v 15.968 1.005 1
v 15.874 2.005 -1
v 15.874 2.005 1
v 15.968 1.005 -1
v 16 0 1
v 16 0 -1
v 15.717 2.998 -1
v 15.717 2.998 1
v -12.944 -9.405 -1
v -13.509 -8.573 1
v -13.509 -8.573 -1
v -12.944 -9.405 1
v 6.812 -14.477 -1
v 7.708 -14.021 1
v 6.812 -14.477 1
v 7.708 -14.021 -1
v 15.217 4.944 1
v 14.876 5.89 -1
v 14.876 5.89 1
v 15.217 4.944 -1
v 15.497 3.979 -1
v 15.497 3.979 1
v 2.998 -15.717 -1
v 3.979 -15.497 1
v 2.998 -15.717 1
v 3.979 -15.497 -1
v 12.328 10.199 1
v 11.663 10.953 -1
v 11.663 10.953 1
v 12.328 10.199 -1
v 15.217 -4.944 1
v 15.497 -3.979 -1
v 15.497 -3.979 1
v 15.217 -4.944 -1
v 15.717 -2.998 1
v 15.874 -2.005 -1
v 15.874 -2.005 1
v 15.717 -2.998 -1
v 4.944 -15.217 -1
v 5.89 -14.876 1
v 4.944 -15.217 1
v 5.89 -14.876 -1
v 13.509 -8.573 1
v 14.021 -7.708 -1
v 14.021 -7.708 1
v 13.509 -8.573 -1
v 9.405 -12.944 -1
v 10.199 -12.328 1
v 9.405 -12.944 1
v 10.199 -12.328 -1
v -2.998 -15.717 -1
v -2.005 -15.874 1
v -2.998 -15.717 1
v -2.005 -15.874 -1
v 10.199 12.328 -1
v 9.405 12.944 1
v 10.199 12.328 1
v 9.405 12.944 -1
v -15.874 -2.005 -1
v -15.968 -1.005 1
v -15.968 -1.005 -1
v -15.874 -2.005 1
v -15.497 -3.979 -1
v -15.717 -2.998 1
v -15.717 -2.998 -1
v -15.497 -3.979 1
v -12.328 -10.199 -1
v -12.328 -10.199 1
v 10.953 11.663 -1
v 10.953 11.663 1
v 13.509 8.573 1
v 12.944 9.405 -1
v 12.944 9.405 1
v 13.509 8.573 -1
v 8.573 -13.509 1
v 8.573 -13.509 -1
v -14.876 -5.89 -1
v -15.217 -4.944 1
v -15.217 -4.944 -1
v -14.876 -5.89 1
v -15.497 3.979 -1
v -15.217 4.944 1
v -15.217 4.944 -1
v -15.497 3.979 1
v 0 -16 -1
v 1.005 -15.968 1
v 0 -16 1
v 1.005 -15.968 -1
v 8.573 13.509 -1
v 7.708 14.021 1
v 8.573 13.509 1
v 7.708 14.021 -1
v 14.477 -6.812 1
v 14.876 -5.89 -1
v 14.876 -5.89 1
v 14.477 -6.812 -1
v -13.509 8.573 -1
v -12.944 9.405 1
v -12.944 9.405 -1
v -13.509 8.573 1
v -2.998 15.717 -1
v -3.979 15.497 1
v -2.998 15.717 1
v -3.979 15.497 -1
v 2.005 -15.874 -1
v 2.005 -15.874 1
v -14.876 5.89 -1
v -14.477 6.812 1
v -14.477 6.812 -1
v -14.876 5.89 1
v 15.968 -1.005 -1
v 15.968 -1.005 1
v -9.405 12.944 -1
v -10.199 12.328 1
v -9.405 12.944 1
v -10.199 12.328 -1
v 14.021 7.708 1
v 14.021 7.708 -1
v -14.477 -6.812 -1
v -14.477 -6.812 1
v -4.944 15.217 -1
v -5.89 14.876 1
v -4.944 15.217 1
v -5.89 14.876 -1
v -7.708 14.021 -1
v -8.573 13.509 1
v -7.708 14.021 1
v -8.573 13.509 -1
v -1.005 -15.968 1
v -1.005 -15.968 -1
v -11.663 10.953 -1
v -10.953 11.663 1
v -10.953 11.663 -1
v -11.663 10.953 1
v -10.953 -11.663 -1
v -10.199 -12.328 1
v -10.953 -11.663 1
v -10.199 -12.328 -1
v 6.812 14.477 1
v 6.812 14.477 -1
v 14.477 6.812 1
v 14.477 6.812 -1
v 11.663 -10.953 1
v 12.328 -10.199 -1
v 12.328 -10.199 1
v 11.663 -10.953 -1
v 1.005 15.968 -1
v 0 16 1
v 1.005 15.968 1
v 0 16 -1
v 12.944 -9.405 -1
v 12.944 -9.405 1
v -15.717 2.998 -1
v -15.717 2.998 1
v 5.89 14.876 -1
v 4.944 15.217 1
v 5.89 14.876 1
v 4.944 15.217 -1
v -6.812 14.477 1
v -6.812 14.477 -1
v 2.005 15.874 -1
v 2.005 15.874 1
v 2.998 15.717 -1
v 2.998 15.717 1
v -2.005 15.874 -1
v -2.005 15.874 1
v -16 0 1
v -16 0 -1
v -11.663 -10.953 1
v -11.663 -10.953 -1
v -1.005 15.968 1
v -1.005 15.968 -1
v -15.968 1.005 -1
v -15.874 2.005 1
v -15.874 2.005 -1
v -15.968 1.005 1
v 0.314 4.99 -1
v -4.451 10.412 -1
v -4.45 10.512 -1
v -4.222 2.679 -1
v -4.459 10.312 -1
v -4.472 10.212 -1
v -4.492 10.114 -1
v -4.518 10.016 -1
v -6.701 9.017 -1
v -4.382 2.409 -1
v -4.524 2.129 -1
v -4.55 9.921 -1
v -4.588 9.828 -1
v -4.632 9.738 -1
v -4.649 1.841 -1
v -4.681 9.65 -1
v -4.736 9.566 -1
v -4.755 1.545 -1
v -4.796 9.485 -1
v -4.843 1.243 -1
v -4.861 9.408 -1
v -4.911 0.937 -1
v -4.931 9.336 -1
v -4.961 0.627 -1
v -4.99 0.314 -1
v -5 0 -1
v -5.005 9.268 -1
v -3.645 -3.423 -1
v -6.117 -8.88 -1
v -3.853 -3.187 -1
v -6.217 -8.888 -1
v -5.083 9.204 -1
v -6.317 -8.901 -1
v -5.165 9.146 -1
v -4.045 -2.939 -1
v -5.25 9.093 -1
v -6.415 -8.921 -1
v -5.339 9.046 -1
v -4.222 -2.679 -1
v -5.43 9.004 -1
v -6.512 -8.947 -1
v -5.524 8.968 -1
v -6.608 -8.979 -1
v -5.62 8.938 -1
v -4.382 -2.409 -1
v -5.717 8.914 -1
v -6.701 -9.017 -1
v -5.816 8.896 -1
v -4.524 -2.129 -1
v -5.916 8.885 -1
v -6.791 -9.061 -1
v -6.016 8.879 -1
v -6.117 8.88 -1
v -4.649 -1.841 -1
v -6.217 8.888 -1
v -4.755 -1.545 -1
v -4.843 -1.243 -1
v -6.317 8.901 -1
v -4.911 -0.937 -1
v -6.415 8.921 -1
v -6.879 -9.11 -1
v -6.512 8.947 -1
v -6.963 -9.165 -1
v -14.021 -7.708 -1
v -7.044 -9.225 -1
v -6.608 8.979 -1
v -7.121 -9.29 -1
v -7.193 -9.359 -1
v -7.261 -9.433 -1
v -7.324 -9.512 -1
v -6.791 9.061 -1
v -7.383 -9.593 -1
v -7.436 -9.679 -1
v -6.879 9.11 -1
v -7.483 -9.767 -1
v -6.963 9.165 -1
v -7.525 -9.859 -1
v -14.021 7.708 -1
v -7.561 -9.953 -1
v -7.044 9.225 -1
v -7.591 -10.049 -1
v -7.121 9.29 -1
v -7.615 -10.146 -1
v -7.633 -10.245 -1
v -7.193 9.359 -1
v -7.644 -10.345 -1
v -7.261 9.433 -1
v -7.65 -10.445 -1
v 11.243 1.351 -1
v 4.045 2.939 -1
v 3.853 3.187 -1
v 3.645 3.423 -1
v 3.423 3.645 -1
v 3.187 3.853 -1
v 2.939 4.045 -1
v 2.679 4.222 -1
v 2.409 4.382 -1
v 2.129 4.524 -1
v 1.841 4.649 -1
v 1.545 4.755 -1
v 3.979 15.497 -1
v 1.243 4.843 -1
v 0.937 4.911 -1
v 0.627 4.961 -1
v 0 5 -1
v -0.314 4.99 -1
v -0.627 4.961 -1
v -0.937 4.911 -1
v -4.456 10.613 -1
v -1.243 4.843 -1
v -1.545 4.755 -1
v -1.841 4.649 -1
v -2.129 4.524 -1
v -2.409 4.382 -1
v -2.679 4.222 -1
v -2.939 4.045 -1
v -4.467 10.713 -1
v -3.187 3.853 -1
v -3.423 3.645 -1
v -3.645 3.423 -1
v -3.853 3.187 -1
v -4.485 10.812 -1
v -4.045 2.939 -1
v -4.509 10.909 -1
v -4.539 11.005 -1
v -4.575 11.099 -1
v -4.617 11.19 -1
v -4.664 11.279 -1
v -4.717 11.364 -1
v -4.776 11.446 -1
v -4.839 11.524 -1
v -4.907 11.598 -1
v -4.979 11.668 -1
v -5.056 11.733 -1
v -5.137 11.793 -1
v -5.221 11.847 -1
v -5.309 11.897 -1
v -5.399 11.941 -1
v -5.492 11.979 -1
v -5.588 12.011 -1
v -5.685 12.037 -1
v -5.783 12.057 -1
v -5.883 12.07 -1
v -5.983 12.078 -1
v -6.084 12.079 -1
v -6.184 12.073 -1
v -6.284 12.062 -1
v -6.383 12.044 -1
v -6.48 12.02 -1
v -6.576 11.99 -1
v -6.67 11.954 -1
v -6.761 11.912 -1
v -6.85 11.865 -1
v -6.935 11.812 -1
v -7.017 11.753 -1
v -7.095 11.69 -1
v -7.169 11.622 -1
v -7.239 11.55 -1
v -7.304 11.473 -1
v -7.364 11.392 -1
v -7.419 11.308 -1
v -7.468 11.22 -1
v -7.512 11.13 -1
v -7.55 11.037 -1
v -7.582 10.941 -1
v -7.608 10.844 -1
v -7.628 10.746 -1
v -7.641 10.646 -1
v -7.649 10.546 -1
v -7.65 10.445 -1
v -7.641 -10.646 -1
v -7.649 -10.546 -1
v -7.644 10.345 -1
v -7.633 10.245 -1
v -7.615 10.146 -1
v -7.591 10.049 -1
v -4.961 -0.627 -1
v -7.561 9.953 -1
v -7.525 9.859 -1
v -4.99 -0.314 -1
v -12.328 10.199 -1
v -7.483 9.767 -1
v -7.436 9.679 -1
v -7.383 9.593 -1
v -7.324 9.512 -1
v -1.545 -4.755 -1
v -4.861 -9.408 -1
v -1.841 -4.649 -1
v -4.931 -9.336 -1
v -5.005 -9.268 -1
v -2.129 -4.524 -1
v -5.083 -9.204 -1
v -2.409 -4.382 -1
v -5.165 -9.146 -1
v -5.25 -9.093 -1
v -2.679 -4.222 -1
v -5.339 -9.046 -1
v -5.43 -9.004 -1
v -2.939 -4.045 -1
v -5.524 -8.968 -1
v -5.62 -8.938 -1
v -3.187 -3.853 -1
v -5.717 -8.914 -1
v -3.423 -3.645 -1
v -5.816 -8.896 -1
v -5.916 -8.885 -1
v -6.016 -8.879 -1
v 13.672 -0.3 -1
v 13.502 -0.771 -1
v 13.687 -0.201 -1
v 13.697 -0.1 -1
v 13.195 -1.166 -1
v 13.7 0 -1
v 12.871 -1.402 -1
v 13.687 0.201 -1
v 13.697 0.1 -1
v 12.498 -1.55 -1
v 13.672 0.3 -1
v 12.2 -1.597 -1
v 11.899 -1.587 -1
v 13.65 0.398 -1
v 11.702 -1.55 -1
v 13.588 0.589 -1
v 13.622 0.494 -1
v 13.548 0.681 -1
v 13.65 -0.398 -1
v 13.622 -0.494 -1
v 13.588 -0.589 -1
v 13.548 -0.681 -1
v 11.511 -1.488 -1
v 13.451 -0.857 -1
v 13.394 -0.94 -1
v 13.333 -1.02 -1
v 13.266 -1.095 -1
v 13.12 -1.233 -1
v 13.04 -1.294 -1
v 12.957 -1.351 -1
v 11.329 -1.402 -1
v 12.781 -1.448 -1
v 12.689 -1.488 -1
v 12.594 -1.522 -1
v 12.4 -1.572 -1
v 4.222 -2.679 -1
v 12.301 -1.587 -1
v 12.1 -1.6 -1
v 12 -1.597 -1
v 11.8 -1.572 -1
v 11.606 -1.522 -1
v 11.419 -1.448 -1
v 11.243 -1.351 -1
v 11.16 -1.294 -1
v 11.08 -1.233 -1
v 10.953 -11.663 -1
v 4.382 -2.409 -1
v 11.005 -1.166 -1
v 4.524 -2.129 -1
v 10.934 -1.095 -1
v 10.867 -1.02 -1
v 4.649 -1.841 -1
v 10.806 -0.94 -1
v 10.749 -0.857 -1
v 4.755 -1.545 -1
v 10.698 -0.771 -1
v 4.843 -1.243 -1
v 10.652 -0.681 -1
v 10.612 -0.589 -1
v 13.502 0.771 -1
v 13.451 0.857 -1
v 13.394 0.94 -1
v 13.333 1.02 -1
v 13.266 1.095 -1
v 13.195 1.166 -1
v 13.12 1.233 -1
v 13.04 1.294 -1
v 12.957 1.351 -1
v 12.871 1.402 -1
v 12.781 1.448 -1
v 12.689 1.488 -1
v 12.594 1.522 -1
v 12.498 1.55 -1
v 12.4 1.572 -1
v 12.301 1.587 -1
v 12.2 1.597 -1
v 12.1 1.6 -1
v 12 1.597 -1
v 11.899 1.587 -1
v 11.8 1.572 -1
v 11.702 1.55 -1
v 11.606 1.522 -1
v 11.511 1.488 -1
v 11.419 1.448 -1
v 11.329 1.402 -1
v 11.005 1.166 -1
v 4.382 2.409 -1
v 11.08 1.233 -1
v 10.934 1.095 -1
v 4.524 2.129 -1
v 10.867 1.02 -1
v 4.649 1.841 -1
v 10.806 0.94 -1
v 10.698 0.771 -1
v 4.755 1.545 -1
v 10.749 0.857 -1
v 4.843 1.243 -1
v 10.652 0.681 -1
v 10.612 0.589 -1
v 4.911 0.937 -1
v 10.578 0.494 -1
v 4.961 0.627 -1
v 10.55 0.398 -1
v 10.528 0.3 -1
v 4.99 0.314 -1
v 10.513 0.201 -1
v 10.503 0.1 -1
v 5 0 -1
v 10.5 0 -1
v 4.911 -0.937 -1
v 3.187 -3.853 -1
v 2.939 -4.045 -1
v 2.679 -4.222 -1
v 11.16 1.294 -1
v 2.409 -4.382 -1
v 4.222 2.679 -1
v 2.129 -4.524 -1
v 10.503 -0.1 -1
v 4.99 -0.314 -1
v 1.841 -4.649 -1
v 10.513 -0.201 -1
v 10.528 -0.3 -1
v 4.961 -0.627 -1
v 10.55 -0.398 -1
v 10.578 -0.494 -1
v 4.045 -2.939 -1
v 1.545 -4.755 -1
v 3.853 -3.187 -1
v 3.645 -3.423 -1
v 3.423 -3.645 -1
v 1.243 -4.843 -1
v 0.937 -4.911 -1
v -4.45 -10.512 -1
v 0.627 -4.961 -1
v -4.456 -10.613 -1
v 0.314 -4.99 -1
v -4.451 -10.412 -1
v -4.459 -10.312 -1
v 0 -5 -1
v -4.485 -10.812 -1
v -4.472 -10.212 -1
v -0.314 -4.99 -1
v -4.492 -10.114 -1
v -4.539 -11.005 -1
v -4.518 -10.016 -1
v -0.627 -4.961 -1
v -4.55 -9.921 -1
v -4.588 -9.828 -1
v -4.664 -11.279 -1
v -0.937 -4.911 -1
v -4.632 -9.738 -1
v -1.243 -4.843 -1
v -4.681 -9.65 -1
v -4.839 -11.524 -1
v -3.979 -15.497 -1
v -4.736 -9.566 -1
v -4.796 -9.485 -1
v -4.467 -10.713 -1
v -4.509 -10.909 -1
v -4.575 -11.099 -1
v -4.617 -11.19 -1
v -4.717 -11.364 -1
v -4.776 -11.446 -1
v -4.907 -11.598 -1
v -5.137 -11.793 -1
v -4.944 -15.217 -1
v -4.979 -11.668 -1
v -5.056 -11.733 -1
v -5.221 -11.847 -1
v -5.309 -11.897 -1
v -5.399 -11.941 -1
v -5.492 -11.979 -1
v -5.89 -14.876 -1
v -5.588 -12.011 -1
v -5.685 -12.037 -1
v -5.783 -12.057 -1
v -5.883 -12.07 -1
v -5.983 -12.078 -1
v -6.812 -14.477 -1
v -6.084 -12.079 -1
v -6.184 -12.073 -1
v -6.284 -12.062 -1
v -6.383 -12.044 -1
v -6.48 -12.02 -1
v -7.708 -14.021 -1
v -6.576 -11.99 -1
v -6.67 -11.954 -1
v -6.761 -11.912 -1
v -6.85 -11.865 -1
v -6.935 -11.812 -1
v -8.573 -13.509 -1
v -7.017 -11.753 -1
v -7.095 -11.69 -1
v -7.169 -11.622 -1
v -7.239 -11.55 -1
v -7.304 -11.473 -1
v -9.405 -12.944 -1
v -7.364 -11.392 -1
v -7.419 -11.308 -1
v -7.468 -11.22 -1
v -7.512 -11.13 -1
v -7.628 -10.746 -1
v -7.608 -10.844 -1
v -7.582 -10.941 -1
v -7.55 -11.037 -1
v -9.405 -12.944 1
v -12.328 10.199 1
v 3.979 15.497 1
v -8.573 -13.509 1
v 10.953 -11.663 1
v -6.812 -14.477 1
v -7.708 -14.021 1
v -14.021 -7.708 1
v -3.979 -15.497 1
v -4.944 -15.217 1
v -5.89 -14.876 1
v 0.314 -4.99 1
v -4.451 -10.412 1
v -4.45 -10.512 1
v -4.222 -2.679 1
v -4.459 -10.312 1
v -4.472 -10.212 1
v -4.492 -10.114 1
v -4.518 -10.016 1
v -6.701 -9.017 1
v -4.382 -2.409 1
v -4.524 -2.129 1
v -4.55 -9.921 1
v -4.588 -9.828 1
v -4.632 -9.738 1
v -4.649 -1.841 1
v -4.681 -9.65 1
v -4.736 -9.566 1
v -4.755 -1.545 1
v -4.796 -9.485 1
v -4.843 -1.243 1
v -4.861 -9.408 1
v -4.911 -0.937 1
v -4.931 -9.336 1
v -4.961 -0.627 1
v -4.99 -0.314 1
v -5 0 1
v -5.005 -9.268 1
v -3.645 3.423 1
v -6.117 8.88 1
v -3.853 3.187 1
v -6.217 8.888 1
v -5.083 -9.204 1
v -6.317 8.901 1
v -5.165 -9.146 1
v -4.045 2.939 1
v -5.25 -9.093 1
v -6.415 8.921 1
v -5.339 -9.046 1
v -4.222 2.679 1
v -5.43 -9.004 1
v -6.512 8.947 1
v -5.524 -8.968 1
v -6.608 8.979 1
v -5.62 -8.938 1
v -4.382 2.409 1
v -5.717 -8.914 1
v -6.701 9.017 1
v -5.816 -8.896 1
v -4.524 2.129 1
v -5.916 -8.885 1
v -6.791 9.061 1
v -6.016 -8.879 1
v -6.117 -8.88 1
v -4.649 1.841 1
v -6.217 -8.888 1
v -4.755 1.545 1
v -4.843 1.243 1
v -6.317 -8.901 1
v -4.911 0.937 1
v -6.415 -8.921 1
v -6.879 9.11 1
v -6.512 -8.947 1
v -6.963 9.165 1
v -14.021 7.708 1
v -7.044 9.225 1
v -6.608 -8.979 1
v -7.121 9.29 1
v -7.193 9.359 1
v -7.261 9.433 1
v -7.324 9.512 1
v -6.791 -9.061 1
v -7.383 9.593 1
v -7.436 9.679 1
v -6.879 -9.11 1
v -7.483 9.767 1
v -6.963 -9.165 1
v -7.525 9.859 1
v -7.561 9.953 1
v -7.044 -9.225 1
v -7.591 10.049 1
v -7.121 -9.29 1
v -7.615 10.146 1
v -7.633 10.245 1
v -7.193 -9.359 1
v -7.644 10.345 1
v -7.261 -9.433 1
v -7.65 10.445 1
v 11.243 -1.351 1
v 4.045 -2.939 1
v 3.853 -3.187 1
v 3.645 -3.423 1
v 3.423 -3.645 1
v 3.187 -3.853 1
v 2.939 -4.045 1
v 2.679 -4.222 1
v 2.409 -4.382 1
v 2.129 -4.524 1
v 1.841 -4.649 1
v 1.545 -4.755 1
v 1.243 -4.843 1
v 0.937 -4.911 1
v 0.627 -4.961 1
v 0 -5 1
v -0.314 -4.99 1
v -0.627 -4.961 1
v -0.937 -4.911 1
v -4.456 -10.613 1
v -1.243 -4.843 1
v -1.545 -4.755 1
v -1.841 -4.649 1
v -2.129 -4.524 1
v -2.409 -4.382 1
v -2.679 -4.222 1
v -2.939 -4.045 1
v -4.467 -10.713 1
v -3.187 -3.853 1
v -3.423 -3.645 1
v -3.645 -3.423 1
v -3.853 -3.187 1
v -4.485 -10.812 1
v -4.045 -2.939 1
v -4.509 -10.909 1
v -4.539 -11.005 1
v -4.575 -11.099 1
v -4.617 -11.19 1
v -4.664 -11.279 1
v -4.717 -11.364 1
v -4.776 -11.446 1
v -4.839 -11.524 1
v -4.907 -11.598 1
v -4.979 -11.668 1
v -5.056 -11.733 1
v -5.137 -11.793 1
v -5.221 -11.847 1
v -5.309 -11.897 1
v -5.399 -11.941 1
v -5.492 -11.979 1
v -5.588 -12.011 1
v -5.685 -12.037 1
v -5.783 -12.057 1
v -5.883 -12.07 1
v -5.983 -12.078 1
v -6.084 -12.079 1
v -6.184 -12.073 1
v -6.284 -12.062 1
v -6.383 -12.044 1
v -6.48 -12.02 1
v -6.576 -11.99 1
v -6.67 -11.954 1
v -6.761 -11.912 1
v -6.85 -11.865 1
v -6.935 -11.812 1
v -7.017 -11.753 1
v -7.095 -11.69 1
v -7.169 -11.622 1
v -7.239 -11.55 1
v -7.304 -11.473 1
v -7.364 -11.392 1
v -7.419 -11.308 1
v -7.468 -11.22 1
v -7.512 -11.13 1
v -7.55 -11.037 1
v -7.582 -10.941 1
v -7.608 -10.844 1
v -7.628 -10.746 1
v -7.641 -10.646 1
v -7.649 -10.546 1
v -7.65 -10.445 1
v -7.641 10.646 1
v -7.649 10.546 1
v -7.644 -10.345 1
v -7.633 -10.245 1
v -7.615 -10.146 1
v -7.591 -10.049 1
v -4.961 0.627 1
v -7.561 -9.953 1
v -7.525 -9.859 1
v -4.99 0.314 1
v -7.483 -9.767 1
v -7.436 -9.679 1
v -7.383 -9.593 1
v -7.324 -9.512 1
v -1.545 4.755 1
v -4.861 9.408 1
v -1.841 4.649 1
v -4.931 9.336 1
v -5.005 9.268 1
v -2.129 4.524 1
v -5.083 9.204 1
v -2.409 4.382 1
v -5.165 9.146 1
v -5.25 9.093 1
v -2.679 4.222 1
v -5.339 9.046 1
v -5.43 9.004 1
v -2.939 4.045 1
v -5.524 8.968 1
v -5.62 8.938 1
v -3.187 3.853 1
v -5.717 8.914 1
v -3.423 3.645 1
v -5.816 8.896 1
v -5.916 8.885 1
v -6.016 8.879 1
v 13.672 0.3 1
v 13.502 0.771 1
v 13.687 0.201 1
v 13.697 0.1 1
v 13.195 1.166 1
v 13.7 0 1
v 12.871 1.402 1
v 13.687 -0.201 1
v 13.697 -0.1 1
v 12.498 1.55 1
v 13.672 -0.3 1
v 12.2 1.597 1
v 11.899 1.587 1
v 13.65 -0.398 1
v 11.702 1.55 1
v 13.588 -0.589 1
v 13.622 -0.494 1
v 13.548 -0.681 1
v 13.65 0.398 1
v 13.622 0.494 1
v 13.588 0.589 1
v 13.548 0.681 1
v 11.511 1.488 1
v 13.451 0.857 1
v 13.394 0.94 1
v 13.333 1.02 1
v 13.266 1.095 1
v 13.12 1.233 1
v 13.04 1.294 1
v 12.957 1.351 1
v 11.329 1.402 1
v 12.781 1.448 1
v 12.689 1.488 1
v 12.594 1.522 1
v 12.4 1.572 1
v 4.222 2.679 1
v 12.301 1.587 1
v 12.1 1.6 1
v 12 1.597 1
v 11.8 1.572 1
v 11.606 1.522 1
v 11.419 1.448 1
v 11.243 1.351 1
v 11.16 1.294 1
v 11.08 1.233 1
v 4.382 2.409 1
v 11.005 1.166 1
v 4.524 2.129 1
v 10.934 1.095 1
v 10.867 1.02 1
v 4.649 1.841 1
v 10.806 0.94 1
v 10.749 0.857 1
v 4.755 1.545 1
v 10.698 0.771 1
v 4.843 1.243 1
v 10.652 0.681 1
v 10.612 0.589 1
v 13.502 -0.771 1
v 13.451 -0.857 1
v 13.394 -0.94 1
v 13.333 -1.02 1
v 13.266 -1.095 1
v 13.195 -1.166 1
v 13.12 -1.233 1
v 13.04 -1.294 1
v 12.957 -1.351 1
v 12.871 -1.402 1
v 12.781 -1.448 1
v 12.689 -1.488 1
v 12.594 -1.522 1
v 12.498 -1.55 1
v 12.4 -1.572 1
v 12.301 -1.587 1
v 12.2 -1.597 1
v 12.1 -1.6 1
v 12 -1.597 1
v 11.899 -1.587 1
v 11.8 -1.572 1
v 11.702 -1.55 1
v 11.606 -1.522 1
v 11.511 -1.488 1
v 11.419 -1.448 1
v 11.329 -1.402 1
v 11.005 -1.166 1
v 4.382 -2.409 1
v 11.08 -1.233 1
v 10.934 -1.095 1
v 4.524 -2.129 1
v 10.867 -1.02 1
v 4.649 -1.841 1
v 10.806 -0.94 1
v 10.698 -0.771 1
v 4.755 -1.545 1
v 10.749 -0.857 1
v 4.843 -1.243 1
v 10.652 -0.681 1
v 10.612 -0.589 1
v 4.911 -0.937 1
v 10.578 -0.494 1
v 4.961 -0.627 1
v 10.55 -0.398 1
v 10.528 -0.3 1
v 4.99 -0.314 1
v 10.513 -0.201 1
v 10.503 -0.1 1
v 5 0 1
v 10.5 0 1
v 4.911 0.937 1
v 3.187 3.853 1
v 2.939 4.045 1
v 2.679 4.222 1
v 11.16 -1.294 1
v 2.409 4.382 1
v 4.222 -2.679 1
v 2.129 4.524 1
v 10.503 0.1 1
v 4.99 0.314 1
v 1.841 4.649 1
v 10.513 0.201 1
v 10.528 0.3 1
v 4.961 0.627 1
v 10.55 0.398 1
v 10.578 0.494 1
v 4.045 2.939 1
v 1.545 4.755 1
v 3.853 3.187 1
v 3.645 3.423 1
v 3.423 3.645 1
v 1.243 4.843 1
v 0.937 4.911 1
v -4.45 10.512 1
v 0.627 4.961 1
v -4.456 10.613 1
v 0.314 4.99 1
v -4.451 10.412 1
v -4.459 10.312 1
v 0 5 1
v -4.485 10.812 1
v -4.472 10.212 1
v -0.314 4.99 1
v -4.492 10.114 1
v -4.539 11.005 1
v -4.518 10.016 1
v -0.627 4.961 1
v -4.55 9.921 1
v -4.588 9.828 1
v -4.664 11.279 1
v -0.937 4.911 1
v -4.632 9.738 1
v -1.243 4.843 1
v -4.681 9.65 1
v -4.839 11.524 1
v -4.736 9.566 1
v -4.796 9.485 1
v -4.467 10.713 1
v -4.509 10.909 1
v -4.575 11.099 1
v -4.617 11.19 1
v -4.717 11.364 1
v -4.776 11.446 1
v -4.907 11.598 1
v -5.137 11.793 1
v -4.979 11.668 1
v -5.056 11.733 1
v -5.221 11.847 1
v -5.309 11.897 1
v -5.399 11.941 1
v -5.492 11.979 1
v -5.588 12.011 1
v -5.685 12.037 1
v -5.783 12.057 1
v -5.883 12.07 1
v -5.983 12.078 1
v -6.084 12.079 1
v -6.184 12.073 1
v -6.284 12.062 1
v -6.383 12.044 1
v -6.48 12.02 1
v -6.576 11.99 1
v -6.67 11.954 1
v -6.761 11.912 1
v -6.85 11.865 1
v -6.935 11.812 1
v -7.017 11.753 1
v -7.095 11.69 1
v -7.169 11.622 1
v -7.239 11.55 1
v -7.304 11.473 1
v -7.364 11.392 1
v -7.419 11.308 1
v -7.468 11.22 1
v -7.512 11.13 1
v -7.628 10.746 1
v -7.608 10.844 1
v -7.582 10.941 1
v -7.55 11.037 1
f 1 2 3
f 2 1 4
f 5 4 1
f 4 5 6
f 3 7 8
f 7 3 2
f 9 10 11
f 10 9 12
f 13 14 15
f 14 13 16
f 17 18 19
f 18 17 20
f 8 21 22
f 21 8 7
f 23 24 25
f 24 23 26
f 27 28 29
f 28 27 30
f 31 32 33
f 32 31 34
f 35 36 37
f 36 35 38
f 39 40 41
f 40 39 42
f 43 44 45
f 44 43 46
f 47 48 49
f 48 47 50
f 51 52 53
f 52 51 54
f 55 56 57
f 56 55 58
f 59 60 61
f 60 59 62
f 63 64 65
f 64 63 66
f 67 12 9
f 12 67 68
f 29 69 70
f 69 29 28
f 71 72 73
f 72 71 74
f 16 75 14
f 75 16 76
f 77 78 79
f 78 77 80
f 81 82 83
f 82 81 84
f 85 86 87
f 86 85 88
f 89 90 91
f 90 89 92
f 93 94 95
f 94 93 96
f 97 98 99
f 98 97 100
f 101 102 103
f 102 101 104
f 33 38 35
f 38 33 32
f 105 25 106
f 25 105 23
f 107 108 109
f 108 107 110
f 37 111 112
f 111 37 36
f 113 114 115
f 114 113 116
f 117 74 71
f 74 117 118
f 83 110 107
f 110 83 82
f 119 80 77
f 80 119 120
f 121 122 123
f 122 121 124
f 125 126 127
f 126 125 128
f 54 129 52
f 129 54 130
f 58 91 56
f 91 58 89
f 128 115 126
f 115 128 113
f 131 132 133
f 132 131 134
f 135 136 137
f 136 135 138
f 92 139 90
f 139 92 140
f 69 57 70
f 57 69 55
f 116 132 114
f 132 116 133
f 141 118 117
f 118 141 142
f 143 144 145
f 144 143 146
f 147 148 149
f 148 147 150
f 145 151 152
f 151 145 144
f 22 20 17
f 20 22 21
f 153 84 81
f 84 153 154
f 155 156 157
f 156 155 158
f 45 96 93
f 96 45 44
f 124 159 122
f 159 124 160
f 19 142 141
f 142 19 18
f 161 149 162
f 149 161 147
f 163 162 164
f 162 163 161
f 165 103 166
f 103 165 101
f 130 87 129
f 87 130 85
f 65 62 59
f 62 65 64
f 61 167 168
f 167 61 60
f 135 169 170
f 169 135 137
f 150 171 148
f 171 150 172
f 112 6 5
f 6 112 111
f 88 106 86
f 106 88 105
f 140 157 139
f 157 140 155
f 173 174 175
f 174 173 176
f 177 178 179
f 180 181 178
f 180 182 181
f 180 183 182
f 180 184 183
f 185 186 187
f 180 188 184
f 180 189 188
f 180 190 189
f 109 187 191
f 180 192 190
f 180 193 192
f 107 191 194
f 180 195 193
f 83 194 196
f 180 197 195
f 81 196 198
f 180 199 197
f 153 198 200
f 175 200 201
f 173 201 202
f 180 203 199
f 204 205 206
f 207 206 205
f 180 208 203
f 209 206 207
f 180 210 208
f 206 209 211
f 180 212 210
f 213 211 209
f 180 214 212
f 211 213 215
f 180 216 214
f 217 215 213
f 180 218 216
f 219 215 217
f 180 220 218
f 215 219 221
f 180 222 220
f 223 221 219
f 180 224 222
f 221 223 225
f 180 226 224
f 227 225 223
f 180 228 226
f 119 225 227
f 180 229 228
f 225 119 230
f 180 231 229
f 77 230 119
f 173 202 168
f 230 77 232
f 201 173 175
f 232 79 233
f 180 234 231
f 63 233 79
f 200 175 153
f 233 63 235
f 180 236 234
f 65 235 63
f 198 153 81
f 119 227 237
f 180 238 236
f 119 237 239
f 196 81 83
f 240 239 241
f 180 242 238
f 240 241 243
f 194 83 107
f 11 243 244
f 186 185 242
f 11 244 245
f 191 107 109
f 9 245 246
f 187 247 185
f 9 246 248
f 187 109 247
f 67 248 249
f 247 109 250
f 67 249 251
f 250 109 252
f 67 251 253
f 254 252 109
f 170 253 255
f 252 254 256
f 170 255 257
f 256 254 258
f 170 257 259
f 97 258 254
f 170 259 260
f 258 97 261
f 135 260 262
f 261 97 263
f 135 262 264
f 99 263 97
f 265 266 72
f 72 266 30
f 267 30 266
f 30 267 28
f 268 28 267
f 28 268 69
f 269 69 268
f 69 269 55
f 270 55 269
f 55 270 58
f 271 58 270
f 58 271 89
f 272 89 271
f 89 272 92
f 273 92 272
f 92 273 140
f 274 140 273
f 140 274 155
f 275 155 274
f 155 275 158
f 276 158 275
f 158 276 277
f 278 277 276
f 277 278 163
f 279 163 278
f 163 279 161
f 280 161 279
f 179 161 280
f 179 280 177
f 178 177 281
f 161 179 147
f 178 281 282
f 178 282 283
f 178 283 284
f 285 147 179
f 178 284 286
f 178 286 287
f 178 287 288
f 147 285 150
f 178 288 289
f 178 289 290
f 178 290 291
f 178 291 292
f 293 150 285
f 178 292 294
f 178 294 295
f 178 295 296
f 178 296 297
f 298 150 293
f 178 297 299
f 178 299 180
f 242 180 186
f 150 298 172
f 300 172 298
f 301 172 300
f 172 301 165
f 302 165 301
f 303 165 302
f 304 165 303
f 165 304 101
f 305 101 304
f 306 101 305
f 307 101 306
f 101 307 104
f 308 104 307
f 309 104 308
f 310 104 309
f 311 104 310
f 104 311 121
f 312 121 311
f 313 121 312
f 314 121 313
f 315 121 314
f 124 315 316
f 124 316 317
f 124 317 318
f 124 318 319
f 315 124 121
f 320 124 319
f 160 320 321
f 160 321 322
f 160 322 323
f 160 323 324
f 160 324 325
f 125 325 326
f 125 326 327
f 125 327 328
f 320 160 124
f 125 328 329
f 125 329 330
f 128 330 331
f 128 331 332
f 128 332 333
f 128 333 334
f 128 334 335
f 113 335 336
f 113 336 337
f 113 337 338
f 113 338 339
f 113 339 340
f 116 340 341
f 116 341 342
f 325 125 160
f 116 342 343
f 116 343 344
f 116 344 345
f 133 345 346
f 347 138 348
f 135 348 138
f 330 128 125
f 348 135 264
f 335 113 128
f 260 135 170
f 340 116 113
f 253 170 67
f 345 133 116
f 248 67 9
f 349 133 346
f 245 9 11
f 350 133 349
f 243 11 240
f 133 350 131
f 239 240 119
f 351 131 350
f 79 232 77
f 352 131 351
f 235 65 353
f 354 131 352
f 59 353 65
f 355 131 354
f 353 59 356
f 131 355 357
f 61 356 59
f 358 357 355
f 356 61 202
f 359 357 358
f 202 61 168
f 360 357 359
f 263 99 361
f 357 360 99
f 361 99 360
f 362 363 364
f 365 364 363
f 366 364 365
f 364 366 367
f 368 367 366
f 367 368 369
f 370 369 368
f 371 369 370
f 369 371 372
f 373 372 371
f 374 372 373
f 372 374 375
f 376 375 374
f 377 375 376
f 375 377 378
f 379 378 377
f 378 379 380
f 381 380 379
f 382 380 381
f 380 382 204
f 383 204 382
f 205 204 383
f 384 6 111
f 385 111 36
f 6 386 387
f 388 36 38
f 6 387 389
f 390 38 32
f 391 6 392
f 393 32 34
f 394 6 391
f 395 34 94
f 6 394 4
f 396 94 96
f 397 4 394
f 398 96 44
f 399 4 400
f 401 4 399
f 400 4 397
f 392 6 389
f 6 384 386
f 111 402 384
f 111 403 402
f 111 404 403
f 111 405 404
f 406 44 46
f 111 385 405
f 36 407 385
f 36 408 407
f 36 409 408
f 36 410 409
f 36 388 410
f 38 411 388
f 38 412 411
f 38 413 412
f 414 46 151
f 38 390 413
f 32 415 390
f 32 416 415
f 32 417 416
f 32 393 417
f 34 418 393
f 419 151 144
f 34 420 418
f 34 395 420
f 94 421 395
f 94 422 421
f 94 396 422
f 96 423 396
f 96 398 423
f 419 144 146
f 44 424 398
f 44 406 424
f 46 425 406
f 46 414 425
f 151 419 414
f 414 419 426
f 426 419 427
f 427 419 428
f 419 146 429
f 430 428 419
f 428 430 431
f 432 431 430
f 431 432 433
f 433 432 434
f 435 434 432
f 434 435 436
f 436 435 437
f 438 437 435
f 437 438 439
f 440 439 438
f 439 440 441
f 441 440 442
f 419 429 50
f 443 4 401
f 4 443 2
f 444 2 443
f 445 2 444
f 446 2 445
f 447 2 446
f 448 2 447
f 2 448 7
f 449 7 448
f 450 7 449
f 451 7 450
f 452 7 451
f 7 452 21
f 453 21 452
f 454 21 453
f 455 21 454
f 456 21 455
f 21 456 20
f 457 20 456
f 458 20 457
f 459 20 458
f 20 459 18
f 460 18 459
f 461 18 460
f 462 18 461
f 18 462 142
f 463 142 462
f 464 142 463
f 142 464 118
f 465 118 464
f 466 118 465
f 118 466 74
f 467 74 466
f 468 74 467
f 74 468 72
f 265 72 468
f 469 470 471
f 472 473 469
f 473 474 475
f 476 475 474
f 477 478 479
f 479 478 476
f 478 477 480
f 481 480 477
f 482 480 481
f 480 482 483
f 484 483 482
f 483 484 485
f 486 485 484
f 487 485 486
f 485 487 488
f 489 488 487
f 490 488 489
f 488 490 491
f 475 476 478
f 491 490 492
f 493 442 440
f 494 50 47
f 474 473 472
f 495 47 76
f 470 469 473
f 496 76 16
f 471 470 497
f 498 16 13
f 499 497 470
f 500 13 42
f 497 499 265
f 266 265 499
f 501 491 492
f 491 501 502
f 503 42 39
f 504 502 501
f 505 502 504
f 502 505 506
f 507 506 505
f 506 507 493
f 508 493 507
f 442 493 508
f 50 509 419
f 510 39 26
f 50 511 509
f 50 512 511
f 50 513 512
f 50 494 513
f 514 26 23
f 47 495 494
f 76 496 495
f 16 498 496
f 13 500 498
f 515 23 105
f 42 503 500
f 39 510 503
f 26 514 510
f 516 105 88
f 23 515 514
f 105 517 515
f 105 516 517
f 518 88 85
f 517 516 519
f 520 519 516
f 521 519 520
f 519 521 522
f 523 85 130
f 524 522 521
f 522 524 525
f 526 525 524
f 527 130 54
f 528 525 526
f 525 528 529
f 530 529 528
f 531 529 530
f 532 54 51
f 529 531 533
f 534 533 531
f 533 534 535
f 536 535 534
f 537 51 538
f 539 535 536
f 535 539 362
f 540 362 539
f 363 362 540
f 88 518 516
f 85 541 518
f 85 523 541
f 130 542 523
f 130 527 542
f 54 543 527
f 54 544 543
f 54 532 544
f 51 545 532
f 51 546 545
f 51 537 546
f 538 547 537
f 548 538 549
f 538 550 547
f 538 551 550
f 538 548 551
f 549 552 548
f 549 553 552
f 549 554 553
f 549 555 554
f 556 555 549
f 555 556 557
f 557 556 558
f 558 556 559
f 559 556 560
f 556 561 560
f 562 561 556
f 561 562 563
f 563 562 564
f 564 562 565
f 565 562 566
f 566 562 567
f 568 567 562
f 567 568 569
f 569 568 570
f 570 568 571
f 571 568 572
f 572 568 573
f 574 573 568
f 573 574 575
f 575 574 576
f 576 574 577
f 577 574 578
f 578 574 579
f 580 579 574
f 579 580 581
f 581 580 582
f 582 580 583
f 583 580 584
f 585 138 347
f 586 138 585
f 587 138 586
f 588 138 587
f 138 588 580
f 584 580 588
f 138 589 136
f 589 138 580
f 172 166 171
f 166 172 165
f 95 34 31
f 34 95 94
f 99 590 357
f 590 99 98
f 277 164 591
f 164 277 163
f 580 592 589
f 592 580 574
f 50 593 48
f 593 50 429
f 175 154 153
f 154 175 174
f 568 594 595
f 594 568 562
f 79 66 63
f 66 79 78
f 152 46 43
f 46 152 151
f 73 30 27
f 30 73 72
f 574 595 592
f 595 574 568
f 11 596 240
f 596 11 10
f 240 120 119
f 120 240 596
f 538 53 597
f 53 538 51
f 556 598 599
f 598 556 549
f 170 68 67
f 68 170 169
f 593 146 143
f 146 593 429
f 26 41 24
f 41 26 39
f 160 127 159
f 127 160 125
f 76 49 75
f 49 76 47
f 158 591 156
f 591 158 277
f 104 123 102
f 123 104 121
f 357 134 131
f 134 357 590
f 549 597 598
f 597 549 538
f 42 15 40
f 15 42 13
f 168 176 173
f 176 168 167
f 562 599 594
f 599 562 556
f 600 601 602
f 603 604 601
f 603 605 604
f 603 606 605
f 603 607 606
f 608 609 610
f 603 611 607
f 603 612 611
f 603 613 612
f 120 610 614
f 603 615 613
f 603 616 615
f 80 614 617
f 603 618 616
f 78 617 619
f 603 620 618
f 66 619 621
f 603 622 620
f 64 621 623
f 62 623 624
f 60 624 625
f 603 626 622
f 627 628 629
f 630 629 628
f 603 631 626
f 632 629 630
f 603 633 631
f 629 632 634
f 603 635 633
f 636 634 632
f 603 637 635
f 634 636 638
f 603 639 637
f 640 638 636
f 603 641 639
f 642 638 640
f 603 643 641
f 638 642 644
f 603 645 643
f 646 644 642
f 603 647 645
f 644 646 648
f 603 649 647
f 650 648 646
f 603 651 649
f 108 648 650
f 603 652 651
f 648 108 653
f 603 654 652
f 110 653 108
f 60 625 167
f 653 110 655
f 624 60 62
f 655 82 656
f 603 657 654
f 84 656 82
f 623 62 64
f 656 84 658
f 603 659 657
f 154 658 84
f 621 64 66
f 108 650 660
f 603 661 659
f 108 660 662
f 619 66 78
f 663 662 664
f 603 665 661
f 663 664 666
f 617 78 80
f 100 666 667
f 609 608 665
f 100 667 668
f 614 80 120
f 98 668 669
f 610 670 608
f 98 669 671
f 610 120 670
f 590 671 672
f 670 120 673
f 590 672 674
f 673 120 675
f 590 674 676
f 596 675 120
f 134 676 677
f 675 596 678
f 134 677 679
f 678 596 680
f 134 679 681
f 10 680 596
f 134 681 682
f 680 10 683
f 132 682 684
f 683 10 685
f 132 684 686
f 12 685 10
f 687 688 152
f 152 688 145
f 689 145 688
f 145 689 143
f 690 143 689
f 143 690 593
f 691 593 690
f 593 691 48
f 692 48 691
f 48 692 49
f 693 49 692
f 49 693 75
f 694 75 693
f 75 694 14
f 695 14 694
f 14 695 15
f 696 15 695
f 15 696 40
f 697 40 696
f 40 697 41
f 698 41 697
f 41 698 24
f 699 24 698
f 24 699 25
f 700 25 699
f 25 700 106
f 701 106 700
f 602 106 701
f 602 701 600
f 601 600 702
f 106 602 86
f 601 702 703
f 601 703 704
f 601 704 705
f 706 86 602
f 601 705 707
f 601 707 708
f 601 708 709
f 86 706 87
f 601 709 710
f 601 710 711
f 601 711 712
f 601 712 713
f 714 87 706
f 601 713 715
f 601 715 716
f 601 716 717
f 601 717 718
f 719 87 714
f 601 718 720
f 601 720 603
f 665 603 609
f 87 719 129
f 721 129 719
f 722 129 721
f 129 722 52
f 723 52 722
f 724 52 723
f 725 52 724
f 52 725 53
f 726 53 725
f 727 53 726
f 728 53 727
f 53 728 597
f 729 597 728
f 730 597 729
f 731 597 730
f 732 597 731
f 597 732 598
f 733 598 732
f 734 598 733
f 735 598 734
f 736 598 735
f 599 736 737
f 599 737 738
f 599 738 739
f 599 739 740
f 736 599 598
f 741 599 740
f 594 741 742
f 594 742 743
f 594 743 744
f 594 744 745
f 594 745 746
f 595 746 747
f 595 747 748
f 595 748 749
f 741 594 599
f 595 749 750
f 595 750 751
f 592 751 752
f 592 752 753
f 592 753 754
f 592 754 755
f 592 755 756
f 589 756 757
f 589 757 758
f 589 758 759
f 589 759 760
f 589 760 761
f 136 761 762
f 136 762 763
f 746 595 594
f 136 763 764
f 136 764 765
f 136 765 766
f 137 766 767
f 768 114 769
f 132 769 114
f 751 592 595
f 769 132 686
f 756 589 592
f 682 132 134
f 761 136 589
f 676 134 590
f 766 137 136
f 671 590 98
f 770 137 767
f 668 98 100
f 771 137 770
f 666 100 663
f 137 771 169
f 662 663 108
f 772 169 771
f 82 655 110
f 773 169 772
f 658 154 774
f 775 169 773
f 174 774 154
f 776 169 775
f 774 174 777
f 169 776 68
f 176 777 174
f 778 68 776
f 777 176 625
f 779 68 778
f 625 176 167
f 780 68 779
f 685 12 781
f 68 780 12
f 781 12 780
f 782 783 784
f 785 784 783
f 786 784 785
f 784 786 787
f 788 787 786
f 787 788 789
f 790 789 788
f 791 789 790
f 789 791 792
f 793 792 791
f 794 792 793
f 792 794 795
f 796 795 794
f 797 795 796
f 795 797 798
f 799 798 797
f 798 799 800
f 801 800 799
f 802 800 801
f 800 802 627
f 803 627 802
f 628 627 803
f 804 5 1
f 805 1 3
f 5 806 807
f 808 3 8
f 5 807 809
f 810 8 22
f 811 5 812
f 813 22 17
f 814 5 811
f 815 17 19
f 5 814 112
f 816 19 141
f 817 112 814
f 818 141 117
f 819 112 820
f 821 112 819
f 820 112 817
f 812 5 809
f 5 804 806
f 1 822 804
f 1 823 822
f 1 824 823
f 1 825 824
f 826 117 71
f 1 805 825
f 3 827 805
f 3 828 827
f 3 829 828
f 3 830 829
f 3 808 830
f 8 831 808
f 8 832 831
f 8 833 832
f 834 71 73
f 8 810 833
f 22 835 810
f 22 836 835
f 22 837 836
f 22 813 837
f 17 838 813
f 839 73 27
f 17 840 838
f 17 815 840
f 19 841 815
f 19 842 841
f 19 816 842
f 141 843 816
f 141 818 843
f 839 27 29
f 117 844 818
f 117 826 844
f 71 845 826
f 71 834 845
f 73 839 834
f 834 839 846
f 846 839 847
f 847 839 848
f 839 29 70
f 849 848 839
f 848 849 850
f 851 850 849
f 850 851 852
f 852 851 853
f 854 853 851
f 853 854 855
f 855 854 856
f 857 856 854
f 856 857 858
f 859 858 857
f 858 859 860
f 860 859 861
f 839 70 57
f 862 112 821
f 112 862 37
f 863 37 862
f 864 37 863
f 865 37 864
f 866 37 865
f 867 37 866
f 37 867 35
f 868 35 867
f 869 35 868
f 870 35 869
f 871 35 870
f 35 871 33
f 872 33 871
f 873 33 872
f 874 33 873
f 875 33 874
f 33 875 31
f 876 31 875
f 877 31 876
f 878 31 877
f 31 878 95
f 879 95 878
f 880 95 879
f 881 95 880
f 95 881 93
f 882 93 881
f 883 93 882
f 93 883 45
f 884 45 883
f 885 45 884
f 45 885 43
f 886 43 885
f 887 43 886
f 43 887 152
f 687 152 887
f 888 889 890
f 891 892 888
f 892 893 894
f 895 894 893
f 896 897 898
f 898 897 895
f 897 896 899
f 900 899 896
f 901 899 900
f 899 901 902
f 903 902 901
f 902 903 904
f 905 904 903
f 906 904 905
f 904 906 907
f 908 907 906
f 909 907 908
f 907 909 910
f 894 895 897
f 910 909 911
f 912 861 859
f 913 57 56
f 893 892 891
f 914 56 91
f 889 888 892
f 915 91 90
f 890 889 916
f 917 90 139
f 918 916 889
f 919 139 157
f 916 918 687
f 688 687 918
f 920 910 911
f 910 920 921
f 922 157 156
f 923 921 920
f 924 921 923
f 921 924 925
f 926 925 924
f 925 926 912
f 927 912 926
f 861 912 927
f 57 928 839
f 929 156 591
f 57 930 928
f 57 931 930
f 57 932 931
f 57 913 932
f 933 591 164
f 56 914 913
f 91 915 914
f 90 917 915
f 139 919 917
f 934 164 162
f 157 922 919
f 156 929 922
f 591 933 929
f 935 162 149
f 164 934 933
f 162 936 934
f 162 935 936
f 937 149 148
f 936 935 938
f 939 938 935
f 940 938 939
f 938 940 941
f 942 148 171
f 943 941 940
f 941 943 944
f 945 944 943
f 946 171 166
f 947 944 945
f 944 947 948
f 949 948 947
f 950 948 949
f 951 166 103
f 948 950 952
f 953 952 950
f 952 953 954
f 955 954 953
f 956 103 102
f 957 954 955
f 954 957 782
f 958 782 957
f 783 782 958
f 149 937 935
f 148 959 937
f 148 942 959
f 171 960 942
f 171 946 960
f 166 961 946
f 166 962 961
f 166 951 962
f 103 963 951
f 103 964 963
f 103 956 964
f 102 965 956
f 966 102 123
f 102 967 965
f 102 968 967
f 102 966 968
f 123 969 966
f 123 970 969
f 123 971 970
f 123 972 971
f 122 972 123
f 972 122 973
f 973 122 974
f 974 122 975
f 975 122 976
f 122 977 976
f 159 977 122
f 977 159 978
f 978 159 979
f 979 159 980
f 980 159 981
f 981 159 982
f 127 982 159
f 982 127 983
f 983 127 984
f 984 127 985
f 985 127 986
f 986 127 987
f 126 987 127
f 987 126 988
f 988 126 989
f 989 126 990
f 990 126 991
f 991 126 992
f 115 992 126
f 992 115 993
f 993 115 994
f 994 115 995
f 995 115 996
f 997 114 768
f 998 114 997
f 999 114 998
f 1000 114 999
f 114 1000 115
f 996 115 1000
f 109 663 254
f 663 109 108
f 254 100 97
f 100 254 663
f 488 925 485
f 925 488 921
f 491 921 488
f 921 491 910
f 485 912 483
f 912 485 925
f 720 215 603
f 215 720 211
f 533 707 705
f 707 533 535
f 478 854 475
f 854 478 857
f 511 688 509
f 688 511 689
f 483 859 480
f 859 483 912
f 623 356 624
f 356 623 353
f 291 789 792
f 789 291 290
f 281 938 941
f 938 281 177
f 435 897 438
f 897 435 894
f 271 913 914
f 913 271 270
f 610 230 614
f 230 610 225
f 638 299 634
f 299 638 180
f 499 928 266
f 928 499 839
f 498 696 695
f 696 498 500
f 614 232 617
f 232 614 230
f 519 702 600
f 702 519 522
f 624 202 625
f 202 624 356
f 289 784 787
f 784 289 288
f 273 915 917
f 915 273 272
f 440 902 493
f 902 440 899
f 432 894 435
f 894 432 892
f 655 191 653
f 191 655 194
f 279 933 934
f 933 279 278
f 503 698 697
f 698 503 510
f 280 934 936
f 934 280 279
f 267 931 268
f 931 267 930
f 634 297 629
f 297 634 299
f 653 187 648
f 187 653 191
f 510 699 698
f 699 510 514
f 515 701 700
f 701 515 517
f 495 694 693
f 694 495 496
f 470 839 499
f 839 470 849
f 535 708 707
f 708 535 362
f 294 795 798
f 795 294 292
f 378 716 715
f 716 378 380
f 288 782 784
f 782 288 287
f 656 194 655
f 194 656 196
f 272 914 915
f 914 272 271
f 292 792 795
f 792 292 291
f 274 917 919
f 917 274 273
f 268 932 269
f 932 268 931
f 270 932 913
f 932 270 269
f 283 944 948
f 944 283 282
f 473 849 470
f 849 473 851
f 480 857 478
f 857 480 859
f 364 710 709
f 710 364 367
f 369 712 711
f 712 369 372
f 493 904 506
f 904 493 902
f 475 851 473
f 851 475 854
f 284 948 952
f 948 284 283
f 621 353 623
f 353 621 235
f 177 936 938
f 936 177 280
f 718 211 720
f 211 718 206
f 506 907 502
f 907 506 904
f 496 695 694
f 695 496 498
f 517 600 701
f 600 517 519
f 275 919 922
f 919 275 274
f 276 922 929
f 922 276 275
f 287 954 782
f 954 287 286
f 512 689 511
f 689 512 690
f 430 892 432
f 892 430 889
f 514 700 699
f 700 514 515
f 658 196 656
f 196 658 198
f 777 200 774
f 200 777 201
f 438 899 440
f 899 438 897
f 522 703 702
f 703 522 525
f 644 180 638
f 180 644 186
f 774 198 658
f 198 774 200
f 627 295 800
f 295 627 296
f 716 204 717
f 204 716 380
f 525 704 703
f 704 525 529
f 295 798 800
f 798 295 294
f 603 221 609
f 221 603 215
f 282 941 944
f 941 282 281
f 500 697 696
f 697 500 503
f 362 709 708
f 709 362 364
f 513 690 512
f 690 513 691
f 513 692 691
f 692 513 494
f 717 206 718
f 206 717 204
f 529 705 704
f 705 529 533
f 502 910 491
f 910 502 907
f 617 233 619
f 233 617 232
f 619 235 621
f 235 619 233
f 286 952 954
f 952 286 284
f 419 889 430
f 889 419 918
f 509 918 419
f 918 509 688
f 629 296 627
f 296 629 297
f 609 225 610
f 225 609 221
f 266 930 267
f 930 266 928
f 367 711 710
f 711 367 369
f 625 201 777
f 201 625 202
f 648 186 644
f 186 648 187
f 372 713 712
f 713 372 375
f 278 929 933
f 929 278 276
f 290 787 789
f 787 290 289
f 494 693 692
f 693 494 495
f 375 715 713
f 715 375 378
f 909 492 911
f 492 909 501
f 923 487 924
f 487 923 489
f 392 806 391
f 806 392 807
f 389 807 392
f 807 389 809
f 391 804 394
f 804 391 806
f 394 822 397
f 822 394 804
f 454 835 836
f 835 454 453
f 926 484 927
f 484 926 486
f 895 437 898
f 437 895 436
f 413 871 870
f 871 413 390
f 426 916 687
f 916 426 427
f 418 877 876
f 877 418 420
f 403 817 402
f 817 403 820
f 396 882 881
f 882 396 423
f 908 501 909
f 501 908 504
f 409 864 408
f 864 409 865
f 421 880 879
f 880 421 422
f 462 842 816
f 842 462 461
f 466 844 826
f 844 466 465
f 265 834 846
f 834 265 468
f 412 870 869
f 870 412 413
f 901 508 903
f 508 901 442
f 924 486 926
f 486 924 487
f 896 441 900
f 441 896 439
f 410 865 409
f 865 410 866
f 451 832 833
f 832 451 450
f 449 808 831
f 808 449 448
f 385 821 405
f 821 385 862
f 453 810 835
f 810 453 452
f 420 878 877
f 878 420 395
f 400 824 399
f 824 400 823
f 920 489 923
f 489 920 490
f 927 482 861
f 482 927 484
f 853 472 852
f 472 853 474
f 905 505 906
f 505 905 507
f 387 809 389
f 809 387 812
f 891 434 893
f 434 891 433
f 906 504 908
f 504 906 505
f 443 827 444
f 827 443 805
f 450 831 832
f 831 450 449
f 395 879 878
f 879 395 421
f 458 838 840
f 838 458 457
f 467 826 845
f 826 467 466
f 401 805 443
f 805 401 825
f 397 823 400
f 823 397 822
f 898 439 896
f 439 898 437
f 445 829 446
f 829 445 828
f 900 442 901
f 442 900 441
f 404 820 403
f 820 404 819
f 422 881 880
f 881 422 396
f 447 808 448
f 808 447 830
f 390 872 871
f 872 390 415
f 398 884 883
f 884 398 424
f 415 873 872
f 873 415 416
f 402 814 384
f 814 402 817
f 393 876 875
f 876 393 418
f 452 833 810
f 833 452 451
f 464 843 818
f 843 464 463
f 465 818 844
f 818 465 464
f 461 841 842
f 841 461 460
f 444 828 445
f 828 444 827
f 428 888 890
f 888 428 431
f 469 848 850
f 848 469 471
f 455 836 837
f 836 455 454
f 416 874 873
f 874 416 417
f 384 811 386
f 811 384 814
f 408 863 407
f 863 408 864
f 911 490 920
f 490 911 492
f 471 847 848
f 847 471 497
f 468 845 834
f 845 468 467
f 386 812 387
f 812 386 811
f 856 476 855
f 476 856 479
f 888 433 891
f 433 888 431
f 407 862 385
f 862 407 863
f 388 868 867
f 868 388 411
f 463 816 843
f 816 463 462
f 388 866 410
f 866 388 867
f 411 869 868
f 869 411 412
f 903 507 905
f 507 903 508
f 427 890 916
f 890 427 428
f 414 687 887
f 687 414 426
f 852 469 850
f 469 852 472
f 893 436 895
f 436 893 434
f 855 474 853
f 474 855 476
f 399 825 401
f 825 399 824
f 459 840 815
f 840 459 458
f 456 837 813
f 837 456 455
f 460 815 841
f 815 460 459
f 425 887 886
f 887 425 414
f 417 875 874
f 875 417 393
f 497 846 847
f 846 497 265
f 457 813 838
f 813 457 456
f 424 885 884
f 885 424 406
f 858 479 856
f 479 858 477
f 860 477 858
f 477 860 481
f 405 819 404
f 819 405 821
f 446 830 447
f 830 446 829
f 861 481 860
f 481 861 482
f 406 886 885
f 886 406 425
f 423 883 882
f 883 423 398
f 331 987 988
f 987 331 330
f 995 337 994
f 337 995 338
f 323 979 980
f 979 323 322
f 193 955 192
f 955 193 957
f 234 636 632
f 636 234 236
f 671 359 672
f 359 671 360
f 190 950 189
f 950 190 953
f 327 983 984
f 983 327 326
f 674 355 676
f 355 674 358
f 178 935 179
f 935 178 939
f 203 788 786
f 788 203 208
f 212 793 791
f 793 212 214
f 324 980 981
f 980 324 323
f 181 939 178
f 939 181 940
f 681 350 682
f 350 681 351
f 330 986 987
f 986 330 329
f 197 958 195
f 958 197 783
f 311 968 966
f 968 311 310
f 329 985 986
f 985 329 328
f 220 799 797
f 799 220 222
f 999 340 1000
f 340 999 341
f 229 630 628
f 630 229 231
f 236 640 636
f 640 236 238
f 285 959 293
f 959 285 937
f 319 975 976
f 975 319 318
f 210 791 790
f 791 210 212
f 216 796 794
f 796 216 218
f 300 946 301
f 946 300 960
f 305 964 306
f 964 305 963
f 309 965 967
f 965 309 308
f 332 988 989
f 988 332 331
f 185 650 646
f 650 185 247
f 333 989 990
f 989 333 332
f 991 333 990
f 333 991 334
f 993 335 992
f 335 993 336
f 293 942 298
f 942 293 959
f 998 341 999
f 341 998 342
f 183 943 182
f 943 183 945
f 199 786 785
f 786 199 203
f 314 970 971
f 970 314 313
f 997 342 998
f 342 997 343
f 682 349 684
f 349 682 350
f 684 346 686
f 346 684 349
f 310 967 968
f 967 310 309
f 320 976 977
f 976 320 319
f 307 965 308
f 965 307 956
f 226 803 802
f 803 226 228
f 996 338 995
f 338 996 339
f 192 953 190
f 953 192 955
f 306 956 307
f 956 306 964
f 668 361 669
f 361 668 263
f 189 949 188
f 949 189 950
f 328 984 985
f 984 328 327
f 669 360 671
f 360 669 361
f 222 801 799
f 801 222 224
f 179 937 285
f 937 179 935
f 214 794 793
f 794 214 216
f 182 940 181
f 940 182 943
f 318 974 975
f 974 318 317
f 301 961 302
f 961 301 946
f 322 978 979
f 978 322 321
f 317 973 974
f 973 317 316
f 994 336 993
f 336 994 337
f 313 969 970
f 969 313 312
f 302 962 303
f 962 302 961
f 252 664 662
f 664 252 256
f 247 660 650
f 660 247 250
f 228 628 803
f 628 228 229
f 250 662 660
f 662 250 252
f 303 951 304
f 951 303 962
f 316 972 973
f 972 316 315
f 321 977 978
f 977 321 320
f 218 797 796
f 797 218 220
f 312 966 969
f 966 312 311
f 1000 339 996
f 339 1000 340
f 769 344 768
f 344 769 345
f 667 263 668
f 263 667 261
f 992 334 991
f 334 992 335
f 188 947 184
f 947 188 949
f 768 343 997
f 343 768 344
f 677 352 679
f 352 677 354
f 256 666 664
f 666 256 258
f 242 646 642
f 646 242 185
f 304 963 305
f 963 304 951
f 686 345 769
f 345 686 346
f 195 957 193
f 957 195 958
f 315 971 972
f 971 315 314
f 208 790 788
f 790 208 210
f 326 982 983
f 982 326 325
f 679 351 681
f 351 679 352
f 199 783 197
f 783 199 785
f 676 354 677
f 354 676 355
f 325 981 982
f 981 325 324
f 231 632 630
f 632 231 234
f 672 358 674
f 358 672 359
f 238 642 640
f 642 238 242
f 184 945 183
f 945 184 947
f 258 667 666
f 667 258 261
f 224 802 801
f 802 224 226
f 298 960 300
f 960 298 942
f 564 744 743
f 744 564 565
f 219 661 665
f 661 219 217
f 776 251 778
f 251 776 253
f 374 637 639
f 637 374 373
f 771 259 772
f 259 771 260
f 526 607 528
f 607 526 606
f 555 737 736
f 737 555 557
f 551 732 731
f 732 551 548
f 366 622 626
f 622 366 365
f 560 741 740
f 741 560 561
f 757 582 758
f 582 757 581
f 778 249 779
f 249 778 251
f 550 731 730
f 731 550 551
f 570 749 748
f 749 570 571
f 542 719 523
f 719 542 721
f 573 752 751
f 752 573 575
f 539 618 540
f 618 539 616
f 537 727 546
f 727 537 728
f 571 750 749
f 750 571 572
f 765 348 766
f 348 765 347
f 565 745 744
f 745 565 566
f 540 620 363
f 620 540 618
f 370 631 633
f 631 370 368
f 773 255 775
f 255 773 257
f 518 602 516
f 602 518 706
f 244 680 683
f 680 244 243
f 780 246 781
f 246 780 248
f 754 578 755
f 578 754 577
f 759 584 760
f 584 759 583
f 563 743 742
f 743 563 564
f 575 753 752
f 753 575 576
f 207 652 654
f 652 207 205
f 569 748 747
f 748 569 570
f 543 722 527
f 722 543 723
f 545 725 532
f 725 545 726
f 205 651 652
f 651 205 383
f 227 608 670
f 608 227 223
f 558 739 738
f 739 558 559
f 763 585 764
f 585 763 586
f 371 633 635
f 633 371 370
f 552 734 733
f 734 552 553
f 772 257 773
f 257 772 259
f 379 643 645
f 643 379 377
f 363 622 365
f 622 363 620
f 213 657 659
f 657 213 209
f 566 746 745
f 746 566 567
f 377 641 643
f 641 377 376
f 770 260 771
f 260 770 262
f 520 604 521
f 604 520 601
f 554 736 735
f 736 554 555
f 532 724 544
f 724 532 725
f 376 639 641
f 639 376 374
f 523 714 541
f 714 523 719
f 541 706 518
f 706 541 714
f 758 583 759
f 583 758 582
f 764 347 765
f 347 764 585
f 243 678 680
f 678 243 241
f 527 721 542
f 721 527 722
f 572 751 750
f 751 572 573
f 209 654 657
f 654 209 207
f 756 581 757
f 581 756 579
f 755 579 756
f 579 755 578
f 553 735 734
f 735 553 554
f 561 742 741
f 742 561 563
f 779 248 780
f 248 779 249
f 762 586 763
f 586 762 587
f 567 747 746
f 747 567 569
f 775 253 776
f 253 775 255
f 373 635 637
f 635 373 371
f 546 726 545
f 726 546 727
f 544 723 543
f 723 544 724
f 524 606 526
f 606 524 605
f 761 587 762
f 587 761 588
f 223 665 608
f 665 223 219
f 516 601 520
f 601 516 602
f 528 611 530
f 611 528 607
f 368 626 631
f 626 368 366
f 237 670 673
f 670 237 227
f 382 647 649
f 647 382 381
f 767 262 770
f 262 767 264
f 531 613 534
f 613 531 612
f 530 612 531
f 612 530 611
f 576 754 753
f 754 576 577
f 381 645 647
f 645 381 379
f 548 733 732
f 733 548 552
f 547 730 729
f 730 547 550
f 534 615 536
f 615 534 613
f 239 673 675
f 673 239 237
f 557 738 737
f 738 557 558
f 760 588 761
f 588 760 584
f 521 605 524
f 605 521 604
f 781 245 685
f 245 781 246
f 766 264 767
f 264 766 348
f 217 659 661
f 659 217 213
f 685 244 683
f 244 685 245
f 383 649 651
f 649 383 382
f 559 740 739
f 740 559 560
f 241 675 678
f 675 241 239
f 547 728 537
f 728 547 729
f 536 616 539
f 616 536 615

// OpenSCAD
$fn=40; // model faces resolution.

prumer_rotoru1=50;
vyska_rotoru1=5;
vyska_rotoru2=5;
prumer_sroubu=3.2;
vyska_matky=3;
sirka_matky=6;
prumer_orechu=10;
sila_materialu=3;
sila_materialu_vule=0.2;
hloubka_prekryti=2;

//lozisko
lozisko_prumer_vnitrni=5;
lozisko_prumer_vnejsi=16;
lozisko_vyska=5;
lozisko_prekryv=1.5;

//stator1
stator1_sila=2;

//stator1
sila_pod_loziskem=1;



//nastevní rotoru2
vyska_kryti=5;

//lopatka
hloubka_uchytu=20;
sila_uchytu=12;
vyska_uchytu=10;
tolerance_uchytu=0.1;










difference()
{
cylinder (h = stator1_sila, r=(lozisko_prumer_vnejsi+10+sirka_matky)/2, center = true, $fn=100);
    

//otvor pro hridel rotoru
translate([0,0,0])
cylinder (h = stator1_sila+0.1, r=(lozisko_prumer_vnitrni+2*lozisko_prekryv+2)/2, center = true, $fn=100);    
  
   
   
//otvor pro sroub 1
      translate([(lozisko_prumer_vnejsi+prumer_sroubu+5)/2,0,0])
cylinder (h = stator1_sila+0.1, r=prumer_sroubu/2, center = true, $fn=100);

//otvor pro sroub 2
    rotate(a=[0,0,120])
      translate([(lozisko_prumer_vnejsi+prumer_sroubu+5)/2,0,0])

cylinder (h = stator1_sila+0.1, r=prumer_sroubu/2, center = true, $fn=100);
   
   //otvor pro sroub 3
   rotate(a=[0,0,240]) 
      translate([(lozisko_prumer_vnejsi+prumer_sroubu+5)/2,0,0])

cylinder (h = stator1_sila+0.1, r=prumer_sroubu/2, center = true, $fn=100);
   


  

      
}
